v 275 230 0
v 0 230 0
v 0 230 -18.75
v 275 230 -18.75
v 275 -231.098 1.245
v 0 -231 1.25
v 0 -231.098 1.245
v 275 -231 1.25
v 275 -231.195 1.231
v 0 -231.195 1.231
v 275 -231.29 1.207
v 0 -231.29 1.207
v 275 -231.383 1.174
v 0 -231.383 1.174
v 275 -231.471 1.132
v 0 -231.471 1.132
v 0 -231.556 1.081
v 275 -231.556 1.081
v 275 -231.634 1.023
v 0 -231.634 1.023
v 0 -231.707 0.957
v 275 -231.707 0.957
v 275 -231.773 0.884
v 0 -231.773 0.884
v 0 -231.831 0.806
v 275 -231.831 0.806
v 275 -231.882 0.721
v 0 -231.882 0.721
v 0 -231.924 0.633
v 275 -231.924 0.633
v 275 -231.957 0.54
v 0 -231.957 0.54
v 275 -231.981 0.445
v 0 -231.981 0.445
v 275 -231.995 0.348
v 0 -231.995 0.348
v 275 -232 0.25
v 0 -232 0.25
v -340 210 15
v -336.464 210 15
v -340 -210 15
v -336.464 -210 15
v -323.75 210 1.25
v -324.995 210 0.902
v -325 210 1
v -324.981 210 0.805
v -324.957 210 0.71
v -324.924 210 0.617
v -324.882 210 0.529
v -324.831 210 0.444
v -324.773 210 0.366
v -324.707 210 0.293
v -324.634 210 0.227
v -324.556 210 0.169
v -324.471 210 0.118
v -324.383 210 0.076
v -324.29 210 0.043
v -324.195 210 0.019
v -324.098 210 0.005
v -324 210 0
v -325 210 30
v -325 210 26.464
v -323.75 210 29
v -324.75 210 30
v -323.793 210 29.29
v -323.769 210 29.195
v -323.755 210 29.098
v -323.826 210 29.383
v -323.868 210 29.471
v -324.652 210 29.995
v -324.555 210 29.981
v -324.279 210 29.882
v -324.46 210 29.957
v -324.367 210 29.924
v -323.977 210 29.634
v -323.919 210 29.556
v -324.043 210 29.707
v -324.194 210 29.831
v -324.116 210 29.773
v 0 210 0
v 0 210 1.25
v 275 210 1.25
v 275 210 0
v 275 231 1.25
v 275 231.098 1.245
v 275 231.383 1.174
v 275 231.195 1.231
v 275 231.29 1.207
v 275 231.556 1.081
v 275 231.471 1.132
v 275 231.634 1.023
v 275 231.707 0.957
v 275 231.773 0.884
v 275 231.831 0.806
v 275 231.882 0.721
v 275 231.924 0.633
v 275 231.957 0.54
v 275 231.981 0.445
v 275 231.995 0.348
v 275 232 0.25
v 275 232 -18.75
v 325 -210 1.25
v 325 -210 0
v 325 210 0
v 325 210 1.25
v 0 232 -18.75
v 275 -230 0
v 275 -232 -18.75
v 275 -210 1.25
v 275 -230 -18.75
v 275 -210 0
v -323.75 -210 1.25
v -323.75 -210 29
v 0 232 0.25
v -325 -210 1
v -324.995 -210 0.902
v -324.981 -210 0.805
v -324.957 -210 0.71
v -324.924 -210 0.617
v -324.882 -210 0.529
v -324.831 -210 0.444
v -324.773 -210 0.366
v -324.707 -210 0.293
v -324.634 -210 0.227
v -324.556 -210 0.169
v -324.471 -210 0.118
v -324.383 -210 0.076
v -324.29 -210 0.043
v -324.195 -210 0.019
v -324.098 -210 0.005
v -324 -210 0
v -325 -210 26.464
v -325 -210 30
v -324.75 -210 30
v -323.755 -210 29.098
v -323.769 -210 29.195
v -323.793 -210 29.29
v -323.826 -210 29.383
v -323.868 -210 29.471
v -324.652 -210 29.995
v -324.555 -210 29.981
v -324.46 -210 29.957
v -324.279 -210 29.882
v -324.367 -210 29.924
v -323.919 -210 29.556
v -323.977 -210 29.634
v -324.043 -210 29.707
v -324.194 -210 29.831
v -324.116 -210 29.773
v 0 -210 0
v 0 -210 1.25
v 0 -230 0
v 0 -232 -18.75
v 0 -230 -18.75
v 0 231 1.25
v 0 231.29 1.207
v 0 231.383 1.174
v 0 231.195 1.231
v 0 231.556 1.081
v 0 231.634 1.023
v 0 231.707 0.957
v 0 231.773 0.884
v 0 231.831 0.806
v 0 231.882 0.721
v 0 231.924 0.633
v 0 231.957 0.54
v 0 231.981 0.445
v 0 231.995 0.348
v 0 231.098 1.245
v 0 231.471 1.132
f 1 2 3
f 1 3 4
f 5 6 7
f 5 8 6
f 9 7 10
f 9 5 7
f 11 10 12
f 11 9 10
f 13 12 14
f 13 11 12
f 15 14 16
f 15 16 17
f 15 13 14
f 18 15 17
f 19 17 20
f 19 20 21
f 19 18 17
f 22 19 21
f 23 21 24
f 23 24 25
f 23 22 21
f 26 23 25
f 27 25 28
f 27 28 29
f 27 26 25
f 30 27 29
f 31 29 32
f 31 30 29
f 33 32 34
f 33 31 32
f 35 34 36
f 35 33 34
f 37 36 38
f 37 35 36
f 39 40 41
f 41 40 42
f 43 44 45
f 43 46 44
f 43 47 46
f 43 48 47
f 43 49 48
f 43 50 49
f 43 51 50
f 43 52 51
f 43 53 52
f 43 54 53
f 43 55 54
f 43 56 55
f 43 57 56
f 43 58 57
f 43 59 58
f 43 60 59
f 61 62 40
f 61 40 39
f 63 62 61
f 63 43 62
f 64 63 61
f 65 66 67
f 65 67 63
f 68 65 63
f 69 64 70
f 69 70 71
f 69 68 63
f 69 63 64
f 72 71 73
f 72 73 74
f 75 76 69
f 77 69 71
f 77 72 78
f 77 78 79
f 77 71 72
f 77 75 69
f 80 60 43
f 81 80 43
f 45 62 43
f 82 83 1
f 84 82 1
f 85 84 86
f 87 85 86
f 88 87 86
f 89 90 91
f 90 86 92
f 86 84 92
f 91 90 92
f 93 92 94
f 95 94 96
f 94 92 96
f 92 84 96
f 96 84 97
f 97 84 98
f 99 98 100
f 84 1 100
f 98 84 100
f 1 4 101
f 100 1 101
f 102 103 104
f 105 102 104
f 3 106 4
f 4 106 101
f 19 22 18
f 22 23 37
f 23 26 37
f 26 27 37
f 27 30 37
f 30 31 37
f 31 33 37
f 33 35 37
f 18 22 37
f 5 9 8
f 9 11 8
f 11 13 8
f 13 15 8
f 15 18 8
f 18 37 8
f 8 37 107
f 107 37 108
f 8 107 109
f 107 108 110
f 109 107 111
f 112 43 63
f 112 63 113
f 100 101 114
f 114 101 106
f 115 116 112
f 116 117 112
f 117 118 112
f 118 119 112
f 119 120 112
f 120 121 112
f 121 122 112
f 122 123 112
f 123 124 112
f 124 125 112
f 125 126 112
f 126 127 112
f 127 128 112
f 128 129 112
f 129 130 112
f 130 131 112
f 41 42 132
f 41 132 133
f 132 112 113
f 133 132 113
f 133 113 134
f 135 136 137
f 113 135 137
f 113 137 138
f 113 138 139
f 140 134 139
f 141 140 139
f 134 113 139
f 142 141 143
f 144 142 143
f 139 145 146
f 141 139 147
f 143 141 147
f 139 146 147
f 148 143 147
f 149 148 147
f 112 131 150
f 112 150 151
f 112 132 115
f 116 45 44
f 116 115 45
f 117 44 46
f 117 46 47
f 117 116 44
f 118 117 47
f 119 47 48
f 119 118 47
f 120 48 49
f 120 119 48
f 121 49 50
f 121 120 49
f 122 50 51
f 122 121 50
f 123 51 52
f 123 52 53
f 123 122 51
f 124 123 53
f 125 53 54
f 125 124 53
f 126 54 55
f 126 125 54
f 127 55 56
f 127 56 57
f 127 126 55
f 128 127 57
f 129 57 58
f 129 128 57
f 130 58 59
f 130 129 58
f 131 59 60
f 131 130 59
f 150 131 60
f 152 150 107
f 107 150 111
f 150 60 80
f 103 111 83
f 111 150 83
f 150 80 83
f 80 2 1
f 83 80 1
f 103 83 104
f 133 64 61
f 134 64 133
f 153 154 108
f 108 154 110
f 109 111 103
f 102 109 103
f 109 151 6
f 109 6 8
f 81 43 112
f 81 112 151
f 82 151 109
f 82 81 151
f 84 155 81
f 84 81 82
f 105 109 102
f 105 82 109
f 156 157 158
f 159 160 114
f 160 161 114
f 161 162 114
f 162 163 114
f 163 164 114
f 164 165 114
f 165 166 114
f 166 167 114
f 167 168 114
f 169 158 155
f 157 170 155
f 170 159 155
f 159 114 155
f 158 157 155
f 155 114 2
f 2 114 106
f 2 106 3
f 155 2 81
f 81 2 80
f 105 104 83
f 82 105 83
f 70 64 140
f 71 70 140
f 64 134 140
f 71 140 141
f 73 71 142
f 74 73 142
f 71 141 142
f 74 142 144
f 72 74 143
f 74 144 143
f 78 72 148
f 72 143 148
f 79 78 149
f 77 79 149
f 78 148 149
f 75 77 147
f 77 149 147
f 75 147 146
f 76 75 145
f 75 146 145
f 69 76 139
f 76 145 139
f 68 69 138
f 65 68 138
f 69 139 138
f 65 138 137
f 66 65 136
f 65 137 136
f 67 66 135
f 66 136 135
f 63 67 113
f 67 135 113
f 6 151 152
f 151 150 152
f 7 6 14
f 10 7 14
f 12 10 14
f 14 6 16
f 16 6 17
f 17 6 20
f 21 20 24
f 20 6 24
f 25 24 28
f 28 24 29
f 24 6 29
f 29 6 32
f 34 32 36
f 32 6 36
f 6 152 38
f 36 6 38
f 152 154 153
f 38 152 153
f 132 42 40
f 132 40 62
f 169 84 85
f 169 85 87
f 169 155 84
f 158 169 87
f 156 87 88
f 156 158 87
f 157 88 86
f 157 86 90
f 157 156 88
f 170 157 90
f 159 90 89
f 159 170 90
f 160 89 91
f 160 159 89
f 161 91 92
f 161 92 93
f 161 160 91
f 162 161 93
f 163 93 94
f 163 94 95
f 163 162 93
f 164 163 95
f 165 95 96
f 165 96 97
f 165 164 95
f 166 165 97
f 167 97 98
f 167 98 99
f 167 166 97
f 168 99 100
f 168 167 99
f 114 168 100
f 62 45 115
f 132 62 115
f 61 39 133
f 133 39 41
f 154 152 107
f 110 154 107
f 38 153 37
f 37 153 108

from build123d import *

# Parameters (mm, degrees)
F1_DEPTH  = 1.25
F2_W      = 275
F2_H      = 2
F3_DEPTH  = 20
F4_W      = 1.25
F4_H      = 420
F5_DEPTH  = 30
F6_W      = 420
F6_H      = 15
F7_DEPTH  = 15
F8_SIZE   = 14.99999
F10_R     = 1
F11_R     = 1
F12_DEPTH = 442.001


# Not quite as in the source:
# - a fillet or chamfer is up to 0.001 mm smaller than in the source, because OpenCascade refuses the exact size


with BuildPart() as f1:
    # F0 (on Top) → F1 (new body)
    with BuildSketch(Plane.XY):
        Polygon((0, -232), (275, -232), (275, -210), (325, -210), (325, 210), (275, 210), (275, 232), (0, 232), (0, 210), (-325, 210), (-325, -210), (0, -210), align=None)
    extrude(amount=F1_DEPTH)

    # F2 (on face) → F3 (join)
    with BuildSketch(Plane.XY.offset(1.25)):
        with Locations((137.5, 231)):
            Rectangle(F2_W, F2_H)
        with Locations((137.5, -231)):
            Rectangle(F2_W, F2_H)
    extrude(amount=-F3_DEPTH)

    # F4 (on face) → F5 (join)
    with BuildSketch(Plane(origin=(0, 0, 0), x_dir=(1, 0, 0), z_dir=(0, 0, -1))):
        with Locations((-324.375, 0)):
            Rectangle(F4_W, F4_H)
    extrude(amount=-F5_DEPTH)

    # F6 (on face) → F7 (join)
    with BuildSketch(Plane(origin=(-325, 0, 0), x_dir=(0, -1, 0), z_dir=(-1, 0, 0))):
        with Locations((0, 22.5)):
            Rectangle(F6_W, F6_H)
    extrude(amount=F7_DEPTH)

    # F8 (size 15 in the source; OpenCascade refuses exactly that, so slightly less here)
    f8_edges = [f1.edges().sort_by_distance(p)[0] for p in [
        (-340, 0, 30),
    ]]
    chamfer(f8_edges, length=F8_SIZE)

    # F10
    f10_edges = [f1.edges().sort_by_distance(p)[0] for p in [
        (-323.75, 0, 30),
    ]]
    fillet(f10_edges, radius=F10_R)

    # F11
    f11_edges = [f1.edges().sort_by_distance(p)[0] for p in [
        (-325, 0, 0),
        (137.5, 232, 1.25),
        (137.5, -232, 1.25),
    ]]
    fillet(f11_edges, radius=F11_R)

    # F9 (on face) → F12 (cut, through all)
    with BuildSketch(Plane(origin=(0, 210, 0), x_dir=(-1, 0, 0), z_dir=(0, 1, 0))):
        Polygon((336.4644660941, 15), (325, 26.4644660941), (325, 15), align=None)
    extrude(amount=-F12_DEPTH, mode=Mode.SUBTRACT)


solid = f1.part
